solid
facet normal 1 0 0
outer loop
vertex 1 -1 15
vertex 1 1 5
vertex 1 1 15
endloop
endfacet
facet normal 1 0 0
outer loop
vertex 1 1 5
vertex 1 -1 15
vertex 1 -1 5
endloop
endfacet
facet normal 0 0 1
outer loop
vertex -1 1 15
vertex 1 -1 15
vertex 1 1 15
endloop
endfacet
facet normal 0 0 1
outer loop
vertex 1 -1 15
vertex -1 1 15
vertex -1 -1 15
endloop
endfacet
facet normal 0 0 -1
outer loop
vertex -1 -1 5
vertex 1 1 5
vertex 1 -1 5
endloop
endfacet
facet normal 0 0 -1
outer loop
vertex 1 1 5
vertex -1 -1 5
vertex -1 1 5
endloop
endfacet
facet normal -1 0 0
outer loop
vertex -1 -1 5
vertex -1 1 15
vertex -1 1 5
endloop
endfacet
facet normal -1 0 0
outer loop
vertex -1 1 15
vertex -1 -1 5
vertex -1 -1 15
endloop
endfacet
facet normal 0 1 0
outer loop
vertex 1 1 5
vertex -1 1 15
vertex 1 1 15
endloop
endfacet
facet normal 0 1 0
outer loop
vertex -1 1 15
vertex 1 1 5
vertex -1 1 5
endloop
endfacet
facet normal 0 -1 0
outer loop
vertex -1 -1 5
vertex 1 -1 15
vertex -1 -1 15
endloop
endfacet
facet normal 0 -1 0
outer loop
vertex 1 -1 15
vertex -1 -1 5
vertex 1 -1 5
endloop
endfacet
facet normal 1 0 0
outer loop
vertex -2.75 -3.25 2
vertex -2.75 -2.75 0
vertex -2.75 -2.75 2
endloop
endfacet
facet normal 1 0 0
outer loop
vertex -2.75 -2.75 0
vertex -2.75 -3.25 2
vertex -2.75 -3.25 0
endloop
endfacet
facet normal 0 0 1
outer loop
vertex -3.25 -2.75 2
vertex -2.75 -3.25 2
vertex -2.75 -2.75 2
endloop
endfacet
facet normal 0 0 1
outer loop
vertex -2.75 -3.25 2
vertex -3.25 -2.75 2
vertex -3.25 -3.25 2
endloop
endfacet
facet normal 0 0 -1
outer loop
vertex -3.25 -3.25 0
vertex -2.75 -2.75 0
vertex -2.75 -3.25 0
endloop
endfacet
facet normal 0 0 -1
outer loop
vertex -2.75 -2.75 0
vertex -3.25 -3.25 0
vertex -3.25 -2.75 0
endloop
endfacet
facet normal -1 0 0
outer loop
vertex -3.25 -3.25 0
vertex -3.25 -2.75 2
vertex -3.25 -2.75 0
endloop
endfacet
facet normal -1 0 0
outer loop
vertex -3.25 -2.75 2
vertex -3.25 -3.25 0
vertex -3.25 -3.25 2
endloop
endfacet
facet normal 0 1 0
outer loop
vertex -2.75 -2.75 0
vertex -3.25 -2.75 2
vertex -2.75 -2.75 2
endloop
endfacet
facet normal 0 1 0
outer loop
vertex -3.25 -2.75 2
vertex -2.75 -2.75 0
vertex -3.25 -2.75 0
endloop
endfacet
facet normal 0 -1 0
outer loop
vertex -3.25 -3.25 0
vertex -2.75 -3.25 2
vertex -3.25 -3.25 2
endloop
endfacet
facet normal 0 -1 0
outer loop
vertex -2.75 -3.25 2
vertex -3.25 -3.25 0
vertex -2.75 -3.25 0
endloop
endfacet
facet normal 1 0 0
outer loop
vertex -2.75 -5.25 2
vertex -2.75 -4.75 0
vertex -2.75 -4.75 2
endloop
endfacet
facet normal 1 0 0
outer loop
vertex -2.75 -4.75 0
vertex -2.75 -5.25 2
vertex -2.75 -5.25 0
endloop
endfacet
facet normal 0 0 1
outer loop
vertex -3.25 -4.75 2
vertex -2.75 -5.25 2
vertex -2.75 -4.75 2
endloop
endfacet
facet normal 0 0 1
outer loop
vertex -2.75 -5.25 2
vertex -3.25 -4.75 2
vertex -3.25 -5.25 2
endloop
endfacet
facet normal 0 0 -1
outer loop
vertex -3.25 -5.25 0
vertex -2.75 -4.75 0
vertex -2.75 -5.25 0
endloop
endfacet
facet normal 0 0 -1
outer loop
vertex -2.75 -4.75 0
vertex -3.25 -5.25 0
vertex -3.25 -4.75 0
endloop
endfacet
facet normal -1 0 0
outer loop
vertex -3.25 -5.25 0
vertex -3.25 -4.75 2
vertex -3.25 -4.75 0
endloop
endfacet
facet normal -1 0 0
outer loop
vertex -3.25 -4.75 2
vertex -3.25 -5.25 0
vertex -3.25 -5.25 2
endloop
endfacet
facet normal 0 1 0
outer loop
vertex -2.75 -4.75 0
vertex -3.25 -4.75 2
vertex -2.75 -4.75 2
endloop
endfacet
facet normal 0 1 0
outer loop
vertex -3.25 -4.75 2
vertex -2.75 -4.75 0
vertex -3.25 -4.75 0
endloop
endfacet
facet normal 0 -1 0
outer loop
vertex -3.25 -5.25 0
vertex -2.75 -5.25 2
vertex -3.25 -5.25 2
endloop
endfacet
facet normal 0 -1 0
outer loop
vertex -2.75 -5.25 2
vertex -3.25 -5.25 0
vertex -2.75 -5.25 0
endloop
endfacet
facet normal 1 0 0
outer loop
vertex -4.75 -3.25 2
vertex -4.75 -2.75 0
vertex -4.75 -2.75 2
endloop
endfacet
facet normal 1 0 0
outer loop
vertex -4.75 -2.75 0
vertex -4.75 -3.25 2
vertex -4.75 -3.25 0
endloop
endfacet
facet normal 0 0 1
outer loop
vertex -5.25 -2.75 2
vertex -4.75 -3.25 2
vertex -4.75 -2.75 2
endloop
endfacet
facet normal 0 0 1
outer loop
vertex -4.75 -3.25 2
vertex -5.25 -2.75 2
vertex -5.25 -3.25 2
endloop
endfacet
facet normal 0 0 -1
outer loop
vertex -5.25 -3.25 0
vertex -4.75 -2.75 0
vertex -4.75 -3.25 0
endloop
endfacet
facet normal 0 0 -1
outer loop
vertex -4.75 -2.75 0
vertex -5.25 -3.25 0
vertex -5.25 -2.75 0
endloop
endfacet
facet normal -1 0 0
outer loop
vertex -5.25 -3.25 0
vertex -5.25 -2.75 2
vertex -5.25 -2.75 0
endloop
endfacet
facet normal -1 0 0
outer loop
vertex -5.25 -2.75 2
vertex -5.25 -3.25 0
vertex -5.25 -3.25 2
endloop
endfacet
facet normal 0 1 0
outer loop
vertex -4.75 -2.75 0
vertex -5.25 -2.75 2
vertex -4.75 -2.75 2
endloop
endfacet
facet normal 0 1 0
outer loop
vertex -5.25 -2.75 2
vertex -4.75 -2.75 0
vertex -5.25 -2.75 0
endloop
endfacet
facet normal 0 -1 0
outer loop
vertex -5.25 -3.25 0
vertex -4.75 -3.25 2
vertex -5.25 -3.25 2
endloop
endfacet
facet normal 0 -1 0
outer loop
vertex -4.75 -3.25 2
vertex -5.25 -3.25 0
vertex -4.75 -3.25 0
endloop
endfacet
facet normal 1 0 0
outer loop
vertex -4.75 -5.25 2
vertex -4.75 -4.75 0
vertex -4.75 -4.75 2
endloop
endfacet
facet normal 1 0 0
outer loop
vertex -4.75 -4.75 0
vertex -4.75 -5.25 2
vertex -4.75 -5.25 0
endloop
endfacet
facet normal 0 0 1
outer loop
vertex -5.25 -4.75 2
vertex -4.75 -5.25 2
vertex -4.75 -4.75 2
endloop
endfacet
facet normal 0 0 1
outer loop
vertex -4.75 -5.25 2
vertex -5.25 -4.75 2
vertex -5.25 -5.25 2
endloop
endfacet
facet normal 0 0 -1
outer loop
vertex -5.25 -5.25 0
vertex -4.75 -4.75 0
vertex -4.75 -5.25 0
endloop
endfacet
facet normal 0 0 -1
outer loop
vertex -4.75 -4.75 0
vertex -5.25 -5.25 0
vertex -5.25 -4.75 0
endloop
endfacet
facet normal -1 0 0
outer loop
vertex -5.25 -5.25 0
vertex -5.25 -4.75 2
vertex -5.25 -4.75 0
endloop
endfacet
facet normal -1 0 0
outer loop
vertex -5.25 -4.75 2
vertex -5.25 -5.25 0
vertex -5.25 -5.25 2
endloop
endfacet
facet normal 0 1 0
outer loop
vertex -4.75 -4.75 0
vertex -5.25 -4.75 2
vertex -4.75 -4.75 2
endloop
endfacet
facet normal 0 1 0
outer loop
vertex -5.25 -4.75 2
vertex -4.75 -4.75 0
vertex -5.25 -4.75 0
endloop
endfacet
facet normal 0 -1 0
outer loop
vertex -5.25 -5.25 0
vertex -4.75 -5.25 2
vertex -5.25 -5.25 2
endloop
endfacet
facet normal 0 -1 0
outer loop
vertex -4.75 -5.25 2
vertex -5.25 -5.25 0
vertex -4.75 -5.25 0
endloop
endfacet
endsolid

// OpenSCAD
translate([0, 0, 10]) color([0,1,0,0.9]) cube([2, 2, 10], center=true);
translate([-3, -3, 1]) color([1,0,0]) cube([0.5, 0.5, 2], center=true);
translate([-3, -5, 1]) color([1,0,0]) cube([0.5, 0.5, 2], center=true);
translate([-5, -3, 1]) color([1,0,0]) cube([0.5, 0.5, 2], center=true);
translate([-5, -5, 1]) color([1,0,0]) cube([0.5, 0.5, 2], center=true);
